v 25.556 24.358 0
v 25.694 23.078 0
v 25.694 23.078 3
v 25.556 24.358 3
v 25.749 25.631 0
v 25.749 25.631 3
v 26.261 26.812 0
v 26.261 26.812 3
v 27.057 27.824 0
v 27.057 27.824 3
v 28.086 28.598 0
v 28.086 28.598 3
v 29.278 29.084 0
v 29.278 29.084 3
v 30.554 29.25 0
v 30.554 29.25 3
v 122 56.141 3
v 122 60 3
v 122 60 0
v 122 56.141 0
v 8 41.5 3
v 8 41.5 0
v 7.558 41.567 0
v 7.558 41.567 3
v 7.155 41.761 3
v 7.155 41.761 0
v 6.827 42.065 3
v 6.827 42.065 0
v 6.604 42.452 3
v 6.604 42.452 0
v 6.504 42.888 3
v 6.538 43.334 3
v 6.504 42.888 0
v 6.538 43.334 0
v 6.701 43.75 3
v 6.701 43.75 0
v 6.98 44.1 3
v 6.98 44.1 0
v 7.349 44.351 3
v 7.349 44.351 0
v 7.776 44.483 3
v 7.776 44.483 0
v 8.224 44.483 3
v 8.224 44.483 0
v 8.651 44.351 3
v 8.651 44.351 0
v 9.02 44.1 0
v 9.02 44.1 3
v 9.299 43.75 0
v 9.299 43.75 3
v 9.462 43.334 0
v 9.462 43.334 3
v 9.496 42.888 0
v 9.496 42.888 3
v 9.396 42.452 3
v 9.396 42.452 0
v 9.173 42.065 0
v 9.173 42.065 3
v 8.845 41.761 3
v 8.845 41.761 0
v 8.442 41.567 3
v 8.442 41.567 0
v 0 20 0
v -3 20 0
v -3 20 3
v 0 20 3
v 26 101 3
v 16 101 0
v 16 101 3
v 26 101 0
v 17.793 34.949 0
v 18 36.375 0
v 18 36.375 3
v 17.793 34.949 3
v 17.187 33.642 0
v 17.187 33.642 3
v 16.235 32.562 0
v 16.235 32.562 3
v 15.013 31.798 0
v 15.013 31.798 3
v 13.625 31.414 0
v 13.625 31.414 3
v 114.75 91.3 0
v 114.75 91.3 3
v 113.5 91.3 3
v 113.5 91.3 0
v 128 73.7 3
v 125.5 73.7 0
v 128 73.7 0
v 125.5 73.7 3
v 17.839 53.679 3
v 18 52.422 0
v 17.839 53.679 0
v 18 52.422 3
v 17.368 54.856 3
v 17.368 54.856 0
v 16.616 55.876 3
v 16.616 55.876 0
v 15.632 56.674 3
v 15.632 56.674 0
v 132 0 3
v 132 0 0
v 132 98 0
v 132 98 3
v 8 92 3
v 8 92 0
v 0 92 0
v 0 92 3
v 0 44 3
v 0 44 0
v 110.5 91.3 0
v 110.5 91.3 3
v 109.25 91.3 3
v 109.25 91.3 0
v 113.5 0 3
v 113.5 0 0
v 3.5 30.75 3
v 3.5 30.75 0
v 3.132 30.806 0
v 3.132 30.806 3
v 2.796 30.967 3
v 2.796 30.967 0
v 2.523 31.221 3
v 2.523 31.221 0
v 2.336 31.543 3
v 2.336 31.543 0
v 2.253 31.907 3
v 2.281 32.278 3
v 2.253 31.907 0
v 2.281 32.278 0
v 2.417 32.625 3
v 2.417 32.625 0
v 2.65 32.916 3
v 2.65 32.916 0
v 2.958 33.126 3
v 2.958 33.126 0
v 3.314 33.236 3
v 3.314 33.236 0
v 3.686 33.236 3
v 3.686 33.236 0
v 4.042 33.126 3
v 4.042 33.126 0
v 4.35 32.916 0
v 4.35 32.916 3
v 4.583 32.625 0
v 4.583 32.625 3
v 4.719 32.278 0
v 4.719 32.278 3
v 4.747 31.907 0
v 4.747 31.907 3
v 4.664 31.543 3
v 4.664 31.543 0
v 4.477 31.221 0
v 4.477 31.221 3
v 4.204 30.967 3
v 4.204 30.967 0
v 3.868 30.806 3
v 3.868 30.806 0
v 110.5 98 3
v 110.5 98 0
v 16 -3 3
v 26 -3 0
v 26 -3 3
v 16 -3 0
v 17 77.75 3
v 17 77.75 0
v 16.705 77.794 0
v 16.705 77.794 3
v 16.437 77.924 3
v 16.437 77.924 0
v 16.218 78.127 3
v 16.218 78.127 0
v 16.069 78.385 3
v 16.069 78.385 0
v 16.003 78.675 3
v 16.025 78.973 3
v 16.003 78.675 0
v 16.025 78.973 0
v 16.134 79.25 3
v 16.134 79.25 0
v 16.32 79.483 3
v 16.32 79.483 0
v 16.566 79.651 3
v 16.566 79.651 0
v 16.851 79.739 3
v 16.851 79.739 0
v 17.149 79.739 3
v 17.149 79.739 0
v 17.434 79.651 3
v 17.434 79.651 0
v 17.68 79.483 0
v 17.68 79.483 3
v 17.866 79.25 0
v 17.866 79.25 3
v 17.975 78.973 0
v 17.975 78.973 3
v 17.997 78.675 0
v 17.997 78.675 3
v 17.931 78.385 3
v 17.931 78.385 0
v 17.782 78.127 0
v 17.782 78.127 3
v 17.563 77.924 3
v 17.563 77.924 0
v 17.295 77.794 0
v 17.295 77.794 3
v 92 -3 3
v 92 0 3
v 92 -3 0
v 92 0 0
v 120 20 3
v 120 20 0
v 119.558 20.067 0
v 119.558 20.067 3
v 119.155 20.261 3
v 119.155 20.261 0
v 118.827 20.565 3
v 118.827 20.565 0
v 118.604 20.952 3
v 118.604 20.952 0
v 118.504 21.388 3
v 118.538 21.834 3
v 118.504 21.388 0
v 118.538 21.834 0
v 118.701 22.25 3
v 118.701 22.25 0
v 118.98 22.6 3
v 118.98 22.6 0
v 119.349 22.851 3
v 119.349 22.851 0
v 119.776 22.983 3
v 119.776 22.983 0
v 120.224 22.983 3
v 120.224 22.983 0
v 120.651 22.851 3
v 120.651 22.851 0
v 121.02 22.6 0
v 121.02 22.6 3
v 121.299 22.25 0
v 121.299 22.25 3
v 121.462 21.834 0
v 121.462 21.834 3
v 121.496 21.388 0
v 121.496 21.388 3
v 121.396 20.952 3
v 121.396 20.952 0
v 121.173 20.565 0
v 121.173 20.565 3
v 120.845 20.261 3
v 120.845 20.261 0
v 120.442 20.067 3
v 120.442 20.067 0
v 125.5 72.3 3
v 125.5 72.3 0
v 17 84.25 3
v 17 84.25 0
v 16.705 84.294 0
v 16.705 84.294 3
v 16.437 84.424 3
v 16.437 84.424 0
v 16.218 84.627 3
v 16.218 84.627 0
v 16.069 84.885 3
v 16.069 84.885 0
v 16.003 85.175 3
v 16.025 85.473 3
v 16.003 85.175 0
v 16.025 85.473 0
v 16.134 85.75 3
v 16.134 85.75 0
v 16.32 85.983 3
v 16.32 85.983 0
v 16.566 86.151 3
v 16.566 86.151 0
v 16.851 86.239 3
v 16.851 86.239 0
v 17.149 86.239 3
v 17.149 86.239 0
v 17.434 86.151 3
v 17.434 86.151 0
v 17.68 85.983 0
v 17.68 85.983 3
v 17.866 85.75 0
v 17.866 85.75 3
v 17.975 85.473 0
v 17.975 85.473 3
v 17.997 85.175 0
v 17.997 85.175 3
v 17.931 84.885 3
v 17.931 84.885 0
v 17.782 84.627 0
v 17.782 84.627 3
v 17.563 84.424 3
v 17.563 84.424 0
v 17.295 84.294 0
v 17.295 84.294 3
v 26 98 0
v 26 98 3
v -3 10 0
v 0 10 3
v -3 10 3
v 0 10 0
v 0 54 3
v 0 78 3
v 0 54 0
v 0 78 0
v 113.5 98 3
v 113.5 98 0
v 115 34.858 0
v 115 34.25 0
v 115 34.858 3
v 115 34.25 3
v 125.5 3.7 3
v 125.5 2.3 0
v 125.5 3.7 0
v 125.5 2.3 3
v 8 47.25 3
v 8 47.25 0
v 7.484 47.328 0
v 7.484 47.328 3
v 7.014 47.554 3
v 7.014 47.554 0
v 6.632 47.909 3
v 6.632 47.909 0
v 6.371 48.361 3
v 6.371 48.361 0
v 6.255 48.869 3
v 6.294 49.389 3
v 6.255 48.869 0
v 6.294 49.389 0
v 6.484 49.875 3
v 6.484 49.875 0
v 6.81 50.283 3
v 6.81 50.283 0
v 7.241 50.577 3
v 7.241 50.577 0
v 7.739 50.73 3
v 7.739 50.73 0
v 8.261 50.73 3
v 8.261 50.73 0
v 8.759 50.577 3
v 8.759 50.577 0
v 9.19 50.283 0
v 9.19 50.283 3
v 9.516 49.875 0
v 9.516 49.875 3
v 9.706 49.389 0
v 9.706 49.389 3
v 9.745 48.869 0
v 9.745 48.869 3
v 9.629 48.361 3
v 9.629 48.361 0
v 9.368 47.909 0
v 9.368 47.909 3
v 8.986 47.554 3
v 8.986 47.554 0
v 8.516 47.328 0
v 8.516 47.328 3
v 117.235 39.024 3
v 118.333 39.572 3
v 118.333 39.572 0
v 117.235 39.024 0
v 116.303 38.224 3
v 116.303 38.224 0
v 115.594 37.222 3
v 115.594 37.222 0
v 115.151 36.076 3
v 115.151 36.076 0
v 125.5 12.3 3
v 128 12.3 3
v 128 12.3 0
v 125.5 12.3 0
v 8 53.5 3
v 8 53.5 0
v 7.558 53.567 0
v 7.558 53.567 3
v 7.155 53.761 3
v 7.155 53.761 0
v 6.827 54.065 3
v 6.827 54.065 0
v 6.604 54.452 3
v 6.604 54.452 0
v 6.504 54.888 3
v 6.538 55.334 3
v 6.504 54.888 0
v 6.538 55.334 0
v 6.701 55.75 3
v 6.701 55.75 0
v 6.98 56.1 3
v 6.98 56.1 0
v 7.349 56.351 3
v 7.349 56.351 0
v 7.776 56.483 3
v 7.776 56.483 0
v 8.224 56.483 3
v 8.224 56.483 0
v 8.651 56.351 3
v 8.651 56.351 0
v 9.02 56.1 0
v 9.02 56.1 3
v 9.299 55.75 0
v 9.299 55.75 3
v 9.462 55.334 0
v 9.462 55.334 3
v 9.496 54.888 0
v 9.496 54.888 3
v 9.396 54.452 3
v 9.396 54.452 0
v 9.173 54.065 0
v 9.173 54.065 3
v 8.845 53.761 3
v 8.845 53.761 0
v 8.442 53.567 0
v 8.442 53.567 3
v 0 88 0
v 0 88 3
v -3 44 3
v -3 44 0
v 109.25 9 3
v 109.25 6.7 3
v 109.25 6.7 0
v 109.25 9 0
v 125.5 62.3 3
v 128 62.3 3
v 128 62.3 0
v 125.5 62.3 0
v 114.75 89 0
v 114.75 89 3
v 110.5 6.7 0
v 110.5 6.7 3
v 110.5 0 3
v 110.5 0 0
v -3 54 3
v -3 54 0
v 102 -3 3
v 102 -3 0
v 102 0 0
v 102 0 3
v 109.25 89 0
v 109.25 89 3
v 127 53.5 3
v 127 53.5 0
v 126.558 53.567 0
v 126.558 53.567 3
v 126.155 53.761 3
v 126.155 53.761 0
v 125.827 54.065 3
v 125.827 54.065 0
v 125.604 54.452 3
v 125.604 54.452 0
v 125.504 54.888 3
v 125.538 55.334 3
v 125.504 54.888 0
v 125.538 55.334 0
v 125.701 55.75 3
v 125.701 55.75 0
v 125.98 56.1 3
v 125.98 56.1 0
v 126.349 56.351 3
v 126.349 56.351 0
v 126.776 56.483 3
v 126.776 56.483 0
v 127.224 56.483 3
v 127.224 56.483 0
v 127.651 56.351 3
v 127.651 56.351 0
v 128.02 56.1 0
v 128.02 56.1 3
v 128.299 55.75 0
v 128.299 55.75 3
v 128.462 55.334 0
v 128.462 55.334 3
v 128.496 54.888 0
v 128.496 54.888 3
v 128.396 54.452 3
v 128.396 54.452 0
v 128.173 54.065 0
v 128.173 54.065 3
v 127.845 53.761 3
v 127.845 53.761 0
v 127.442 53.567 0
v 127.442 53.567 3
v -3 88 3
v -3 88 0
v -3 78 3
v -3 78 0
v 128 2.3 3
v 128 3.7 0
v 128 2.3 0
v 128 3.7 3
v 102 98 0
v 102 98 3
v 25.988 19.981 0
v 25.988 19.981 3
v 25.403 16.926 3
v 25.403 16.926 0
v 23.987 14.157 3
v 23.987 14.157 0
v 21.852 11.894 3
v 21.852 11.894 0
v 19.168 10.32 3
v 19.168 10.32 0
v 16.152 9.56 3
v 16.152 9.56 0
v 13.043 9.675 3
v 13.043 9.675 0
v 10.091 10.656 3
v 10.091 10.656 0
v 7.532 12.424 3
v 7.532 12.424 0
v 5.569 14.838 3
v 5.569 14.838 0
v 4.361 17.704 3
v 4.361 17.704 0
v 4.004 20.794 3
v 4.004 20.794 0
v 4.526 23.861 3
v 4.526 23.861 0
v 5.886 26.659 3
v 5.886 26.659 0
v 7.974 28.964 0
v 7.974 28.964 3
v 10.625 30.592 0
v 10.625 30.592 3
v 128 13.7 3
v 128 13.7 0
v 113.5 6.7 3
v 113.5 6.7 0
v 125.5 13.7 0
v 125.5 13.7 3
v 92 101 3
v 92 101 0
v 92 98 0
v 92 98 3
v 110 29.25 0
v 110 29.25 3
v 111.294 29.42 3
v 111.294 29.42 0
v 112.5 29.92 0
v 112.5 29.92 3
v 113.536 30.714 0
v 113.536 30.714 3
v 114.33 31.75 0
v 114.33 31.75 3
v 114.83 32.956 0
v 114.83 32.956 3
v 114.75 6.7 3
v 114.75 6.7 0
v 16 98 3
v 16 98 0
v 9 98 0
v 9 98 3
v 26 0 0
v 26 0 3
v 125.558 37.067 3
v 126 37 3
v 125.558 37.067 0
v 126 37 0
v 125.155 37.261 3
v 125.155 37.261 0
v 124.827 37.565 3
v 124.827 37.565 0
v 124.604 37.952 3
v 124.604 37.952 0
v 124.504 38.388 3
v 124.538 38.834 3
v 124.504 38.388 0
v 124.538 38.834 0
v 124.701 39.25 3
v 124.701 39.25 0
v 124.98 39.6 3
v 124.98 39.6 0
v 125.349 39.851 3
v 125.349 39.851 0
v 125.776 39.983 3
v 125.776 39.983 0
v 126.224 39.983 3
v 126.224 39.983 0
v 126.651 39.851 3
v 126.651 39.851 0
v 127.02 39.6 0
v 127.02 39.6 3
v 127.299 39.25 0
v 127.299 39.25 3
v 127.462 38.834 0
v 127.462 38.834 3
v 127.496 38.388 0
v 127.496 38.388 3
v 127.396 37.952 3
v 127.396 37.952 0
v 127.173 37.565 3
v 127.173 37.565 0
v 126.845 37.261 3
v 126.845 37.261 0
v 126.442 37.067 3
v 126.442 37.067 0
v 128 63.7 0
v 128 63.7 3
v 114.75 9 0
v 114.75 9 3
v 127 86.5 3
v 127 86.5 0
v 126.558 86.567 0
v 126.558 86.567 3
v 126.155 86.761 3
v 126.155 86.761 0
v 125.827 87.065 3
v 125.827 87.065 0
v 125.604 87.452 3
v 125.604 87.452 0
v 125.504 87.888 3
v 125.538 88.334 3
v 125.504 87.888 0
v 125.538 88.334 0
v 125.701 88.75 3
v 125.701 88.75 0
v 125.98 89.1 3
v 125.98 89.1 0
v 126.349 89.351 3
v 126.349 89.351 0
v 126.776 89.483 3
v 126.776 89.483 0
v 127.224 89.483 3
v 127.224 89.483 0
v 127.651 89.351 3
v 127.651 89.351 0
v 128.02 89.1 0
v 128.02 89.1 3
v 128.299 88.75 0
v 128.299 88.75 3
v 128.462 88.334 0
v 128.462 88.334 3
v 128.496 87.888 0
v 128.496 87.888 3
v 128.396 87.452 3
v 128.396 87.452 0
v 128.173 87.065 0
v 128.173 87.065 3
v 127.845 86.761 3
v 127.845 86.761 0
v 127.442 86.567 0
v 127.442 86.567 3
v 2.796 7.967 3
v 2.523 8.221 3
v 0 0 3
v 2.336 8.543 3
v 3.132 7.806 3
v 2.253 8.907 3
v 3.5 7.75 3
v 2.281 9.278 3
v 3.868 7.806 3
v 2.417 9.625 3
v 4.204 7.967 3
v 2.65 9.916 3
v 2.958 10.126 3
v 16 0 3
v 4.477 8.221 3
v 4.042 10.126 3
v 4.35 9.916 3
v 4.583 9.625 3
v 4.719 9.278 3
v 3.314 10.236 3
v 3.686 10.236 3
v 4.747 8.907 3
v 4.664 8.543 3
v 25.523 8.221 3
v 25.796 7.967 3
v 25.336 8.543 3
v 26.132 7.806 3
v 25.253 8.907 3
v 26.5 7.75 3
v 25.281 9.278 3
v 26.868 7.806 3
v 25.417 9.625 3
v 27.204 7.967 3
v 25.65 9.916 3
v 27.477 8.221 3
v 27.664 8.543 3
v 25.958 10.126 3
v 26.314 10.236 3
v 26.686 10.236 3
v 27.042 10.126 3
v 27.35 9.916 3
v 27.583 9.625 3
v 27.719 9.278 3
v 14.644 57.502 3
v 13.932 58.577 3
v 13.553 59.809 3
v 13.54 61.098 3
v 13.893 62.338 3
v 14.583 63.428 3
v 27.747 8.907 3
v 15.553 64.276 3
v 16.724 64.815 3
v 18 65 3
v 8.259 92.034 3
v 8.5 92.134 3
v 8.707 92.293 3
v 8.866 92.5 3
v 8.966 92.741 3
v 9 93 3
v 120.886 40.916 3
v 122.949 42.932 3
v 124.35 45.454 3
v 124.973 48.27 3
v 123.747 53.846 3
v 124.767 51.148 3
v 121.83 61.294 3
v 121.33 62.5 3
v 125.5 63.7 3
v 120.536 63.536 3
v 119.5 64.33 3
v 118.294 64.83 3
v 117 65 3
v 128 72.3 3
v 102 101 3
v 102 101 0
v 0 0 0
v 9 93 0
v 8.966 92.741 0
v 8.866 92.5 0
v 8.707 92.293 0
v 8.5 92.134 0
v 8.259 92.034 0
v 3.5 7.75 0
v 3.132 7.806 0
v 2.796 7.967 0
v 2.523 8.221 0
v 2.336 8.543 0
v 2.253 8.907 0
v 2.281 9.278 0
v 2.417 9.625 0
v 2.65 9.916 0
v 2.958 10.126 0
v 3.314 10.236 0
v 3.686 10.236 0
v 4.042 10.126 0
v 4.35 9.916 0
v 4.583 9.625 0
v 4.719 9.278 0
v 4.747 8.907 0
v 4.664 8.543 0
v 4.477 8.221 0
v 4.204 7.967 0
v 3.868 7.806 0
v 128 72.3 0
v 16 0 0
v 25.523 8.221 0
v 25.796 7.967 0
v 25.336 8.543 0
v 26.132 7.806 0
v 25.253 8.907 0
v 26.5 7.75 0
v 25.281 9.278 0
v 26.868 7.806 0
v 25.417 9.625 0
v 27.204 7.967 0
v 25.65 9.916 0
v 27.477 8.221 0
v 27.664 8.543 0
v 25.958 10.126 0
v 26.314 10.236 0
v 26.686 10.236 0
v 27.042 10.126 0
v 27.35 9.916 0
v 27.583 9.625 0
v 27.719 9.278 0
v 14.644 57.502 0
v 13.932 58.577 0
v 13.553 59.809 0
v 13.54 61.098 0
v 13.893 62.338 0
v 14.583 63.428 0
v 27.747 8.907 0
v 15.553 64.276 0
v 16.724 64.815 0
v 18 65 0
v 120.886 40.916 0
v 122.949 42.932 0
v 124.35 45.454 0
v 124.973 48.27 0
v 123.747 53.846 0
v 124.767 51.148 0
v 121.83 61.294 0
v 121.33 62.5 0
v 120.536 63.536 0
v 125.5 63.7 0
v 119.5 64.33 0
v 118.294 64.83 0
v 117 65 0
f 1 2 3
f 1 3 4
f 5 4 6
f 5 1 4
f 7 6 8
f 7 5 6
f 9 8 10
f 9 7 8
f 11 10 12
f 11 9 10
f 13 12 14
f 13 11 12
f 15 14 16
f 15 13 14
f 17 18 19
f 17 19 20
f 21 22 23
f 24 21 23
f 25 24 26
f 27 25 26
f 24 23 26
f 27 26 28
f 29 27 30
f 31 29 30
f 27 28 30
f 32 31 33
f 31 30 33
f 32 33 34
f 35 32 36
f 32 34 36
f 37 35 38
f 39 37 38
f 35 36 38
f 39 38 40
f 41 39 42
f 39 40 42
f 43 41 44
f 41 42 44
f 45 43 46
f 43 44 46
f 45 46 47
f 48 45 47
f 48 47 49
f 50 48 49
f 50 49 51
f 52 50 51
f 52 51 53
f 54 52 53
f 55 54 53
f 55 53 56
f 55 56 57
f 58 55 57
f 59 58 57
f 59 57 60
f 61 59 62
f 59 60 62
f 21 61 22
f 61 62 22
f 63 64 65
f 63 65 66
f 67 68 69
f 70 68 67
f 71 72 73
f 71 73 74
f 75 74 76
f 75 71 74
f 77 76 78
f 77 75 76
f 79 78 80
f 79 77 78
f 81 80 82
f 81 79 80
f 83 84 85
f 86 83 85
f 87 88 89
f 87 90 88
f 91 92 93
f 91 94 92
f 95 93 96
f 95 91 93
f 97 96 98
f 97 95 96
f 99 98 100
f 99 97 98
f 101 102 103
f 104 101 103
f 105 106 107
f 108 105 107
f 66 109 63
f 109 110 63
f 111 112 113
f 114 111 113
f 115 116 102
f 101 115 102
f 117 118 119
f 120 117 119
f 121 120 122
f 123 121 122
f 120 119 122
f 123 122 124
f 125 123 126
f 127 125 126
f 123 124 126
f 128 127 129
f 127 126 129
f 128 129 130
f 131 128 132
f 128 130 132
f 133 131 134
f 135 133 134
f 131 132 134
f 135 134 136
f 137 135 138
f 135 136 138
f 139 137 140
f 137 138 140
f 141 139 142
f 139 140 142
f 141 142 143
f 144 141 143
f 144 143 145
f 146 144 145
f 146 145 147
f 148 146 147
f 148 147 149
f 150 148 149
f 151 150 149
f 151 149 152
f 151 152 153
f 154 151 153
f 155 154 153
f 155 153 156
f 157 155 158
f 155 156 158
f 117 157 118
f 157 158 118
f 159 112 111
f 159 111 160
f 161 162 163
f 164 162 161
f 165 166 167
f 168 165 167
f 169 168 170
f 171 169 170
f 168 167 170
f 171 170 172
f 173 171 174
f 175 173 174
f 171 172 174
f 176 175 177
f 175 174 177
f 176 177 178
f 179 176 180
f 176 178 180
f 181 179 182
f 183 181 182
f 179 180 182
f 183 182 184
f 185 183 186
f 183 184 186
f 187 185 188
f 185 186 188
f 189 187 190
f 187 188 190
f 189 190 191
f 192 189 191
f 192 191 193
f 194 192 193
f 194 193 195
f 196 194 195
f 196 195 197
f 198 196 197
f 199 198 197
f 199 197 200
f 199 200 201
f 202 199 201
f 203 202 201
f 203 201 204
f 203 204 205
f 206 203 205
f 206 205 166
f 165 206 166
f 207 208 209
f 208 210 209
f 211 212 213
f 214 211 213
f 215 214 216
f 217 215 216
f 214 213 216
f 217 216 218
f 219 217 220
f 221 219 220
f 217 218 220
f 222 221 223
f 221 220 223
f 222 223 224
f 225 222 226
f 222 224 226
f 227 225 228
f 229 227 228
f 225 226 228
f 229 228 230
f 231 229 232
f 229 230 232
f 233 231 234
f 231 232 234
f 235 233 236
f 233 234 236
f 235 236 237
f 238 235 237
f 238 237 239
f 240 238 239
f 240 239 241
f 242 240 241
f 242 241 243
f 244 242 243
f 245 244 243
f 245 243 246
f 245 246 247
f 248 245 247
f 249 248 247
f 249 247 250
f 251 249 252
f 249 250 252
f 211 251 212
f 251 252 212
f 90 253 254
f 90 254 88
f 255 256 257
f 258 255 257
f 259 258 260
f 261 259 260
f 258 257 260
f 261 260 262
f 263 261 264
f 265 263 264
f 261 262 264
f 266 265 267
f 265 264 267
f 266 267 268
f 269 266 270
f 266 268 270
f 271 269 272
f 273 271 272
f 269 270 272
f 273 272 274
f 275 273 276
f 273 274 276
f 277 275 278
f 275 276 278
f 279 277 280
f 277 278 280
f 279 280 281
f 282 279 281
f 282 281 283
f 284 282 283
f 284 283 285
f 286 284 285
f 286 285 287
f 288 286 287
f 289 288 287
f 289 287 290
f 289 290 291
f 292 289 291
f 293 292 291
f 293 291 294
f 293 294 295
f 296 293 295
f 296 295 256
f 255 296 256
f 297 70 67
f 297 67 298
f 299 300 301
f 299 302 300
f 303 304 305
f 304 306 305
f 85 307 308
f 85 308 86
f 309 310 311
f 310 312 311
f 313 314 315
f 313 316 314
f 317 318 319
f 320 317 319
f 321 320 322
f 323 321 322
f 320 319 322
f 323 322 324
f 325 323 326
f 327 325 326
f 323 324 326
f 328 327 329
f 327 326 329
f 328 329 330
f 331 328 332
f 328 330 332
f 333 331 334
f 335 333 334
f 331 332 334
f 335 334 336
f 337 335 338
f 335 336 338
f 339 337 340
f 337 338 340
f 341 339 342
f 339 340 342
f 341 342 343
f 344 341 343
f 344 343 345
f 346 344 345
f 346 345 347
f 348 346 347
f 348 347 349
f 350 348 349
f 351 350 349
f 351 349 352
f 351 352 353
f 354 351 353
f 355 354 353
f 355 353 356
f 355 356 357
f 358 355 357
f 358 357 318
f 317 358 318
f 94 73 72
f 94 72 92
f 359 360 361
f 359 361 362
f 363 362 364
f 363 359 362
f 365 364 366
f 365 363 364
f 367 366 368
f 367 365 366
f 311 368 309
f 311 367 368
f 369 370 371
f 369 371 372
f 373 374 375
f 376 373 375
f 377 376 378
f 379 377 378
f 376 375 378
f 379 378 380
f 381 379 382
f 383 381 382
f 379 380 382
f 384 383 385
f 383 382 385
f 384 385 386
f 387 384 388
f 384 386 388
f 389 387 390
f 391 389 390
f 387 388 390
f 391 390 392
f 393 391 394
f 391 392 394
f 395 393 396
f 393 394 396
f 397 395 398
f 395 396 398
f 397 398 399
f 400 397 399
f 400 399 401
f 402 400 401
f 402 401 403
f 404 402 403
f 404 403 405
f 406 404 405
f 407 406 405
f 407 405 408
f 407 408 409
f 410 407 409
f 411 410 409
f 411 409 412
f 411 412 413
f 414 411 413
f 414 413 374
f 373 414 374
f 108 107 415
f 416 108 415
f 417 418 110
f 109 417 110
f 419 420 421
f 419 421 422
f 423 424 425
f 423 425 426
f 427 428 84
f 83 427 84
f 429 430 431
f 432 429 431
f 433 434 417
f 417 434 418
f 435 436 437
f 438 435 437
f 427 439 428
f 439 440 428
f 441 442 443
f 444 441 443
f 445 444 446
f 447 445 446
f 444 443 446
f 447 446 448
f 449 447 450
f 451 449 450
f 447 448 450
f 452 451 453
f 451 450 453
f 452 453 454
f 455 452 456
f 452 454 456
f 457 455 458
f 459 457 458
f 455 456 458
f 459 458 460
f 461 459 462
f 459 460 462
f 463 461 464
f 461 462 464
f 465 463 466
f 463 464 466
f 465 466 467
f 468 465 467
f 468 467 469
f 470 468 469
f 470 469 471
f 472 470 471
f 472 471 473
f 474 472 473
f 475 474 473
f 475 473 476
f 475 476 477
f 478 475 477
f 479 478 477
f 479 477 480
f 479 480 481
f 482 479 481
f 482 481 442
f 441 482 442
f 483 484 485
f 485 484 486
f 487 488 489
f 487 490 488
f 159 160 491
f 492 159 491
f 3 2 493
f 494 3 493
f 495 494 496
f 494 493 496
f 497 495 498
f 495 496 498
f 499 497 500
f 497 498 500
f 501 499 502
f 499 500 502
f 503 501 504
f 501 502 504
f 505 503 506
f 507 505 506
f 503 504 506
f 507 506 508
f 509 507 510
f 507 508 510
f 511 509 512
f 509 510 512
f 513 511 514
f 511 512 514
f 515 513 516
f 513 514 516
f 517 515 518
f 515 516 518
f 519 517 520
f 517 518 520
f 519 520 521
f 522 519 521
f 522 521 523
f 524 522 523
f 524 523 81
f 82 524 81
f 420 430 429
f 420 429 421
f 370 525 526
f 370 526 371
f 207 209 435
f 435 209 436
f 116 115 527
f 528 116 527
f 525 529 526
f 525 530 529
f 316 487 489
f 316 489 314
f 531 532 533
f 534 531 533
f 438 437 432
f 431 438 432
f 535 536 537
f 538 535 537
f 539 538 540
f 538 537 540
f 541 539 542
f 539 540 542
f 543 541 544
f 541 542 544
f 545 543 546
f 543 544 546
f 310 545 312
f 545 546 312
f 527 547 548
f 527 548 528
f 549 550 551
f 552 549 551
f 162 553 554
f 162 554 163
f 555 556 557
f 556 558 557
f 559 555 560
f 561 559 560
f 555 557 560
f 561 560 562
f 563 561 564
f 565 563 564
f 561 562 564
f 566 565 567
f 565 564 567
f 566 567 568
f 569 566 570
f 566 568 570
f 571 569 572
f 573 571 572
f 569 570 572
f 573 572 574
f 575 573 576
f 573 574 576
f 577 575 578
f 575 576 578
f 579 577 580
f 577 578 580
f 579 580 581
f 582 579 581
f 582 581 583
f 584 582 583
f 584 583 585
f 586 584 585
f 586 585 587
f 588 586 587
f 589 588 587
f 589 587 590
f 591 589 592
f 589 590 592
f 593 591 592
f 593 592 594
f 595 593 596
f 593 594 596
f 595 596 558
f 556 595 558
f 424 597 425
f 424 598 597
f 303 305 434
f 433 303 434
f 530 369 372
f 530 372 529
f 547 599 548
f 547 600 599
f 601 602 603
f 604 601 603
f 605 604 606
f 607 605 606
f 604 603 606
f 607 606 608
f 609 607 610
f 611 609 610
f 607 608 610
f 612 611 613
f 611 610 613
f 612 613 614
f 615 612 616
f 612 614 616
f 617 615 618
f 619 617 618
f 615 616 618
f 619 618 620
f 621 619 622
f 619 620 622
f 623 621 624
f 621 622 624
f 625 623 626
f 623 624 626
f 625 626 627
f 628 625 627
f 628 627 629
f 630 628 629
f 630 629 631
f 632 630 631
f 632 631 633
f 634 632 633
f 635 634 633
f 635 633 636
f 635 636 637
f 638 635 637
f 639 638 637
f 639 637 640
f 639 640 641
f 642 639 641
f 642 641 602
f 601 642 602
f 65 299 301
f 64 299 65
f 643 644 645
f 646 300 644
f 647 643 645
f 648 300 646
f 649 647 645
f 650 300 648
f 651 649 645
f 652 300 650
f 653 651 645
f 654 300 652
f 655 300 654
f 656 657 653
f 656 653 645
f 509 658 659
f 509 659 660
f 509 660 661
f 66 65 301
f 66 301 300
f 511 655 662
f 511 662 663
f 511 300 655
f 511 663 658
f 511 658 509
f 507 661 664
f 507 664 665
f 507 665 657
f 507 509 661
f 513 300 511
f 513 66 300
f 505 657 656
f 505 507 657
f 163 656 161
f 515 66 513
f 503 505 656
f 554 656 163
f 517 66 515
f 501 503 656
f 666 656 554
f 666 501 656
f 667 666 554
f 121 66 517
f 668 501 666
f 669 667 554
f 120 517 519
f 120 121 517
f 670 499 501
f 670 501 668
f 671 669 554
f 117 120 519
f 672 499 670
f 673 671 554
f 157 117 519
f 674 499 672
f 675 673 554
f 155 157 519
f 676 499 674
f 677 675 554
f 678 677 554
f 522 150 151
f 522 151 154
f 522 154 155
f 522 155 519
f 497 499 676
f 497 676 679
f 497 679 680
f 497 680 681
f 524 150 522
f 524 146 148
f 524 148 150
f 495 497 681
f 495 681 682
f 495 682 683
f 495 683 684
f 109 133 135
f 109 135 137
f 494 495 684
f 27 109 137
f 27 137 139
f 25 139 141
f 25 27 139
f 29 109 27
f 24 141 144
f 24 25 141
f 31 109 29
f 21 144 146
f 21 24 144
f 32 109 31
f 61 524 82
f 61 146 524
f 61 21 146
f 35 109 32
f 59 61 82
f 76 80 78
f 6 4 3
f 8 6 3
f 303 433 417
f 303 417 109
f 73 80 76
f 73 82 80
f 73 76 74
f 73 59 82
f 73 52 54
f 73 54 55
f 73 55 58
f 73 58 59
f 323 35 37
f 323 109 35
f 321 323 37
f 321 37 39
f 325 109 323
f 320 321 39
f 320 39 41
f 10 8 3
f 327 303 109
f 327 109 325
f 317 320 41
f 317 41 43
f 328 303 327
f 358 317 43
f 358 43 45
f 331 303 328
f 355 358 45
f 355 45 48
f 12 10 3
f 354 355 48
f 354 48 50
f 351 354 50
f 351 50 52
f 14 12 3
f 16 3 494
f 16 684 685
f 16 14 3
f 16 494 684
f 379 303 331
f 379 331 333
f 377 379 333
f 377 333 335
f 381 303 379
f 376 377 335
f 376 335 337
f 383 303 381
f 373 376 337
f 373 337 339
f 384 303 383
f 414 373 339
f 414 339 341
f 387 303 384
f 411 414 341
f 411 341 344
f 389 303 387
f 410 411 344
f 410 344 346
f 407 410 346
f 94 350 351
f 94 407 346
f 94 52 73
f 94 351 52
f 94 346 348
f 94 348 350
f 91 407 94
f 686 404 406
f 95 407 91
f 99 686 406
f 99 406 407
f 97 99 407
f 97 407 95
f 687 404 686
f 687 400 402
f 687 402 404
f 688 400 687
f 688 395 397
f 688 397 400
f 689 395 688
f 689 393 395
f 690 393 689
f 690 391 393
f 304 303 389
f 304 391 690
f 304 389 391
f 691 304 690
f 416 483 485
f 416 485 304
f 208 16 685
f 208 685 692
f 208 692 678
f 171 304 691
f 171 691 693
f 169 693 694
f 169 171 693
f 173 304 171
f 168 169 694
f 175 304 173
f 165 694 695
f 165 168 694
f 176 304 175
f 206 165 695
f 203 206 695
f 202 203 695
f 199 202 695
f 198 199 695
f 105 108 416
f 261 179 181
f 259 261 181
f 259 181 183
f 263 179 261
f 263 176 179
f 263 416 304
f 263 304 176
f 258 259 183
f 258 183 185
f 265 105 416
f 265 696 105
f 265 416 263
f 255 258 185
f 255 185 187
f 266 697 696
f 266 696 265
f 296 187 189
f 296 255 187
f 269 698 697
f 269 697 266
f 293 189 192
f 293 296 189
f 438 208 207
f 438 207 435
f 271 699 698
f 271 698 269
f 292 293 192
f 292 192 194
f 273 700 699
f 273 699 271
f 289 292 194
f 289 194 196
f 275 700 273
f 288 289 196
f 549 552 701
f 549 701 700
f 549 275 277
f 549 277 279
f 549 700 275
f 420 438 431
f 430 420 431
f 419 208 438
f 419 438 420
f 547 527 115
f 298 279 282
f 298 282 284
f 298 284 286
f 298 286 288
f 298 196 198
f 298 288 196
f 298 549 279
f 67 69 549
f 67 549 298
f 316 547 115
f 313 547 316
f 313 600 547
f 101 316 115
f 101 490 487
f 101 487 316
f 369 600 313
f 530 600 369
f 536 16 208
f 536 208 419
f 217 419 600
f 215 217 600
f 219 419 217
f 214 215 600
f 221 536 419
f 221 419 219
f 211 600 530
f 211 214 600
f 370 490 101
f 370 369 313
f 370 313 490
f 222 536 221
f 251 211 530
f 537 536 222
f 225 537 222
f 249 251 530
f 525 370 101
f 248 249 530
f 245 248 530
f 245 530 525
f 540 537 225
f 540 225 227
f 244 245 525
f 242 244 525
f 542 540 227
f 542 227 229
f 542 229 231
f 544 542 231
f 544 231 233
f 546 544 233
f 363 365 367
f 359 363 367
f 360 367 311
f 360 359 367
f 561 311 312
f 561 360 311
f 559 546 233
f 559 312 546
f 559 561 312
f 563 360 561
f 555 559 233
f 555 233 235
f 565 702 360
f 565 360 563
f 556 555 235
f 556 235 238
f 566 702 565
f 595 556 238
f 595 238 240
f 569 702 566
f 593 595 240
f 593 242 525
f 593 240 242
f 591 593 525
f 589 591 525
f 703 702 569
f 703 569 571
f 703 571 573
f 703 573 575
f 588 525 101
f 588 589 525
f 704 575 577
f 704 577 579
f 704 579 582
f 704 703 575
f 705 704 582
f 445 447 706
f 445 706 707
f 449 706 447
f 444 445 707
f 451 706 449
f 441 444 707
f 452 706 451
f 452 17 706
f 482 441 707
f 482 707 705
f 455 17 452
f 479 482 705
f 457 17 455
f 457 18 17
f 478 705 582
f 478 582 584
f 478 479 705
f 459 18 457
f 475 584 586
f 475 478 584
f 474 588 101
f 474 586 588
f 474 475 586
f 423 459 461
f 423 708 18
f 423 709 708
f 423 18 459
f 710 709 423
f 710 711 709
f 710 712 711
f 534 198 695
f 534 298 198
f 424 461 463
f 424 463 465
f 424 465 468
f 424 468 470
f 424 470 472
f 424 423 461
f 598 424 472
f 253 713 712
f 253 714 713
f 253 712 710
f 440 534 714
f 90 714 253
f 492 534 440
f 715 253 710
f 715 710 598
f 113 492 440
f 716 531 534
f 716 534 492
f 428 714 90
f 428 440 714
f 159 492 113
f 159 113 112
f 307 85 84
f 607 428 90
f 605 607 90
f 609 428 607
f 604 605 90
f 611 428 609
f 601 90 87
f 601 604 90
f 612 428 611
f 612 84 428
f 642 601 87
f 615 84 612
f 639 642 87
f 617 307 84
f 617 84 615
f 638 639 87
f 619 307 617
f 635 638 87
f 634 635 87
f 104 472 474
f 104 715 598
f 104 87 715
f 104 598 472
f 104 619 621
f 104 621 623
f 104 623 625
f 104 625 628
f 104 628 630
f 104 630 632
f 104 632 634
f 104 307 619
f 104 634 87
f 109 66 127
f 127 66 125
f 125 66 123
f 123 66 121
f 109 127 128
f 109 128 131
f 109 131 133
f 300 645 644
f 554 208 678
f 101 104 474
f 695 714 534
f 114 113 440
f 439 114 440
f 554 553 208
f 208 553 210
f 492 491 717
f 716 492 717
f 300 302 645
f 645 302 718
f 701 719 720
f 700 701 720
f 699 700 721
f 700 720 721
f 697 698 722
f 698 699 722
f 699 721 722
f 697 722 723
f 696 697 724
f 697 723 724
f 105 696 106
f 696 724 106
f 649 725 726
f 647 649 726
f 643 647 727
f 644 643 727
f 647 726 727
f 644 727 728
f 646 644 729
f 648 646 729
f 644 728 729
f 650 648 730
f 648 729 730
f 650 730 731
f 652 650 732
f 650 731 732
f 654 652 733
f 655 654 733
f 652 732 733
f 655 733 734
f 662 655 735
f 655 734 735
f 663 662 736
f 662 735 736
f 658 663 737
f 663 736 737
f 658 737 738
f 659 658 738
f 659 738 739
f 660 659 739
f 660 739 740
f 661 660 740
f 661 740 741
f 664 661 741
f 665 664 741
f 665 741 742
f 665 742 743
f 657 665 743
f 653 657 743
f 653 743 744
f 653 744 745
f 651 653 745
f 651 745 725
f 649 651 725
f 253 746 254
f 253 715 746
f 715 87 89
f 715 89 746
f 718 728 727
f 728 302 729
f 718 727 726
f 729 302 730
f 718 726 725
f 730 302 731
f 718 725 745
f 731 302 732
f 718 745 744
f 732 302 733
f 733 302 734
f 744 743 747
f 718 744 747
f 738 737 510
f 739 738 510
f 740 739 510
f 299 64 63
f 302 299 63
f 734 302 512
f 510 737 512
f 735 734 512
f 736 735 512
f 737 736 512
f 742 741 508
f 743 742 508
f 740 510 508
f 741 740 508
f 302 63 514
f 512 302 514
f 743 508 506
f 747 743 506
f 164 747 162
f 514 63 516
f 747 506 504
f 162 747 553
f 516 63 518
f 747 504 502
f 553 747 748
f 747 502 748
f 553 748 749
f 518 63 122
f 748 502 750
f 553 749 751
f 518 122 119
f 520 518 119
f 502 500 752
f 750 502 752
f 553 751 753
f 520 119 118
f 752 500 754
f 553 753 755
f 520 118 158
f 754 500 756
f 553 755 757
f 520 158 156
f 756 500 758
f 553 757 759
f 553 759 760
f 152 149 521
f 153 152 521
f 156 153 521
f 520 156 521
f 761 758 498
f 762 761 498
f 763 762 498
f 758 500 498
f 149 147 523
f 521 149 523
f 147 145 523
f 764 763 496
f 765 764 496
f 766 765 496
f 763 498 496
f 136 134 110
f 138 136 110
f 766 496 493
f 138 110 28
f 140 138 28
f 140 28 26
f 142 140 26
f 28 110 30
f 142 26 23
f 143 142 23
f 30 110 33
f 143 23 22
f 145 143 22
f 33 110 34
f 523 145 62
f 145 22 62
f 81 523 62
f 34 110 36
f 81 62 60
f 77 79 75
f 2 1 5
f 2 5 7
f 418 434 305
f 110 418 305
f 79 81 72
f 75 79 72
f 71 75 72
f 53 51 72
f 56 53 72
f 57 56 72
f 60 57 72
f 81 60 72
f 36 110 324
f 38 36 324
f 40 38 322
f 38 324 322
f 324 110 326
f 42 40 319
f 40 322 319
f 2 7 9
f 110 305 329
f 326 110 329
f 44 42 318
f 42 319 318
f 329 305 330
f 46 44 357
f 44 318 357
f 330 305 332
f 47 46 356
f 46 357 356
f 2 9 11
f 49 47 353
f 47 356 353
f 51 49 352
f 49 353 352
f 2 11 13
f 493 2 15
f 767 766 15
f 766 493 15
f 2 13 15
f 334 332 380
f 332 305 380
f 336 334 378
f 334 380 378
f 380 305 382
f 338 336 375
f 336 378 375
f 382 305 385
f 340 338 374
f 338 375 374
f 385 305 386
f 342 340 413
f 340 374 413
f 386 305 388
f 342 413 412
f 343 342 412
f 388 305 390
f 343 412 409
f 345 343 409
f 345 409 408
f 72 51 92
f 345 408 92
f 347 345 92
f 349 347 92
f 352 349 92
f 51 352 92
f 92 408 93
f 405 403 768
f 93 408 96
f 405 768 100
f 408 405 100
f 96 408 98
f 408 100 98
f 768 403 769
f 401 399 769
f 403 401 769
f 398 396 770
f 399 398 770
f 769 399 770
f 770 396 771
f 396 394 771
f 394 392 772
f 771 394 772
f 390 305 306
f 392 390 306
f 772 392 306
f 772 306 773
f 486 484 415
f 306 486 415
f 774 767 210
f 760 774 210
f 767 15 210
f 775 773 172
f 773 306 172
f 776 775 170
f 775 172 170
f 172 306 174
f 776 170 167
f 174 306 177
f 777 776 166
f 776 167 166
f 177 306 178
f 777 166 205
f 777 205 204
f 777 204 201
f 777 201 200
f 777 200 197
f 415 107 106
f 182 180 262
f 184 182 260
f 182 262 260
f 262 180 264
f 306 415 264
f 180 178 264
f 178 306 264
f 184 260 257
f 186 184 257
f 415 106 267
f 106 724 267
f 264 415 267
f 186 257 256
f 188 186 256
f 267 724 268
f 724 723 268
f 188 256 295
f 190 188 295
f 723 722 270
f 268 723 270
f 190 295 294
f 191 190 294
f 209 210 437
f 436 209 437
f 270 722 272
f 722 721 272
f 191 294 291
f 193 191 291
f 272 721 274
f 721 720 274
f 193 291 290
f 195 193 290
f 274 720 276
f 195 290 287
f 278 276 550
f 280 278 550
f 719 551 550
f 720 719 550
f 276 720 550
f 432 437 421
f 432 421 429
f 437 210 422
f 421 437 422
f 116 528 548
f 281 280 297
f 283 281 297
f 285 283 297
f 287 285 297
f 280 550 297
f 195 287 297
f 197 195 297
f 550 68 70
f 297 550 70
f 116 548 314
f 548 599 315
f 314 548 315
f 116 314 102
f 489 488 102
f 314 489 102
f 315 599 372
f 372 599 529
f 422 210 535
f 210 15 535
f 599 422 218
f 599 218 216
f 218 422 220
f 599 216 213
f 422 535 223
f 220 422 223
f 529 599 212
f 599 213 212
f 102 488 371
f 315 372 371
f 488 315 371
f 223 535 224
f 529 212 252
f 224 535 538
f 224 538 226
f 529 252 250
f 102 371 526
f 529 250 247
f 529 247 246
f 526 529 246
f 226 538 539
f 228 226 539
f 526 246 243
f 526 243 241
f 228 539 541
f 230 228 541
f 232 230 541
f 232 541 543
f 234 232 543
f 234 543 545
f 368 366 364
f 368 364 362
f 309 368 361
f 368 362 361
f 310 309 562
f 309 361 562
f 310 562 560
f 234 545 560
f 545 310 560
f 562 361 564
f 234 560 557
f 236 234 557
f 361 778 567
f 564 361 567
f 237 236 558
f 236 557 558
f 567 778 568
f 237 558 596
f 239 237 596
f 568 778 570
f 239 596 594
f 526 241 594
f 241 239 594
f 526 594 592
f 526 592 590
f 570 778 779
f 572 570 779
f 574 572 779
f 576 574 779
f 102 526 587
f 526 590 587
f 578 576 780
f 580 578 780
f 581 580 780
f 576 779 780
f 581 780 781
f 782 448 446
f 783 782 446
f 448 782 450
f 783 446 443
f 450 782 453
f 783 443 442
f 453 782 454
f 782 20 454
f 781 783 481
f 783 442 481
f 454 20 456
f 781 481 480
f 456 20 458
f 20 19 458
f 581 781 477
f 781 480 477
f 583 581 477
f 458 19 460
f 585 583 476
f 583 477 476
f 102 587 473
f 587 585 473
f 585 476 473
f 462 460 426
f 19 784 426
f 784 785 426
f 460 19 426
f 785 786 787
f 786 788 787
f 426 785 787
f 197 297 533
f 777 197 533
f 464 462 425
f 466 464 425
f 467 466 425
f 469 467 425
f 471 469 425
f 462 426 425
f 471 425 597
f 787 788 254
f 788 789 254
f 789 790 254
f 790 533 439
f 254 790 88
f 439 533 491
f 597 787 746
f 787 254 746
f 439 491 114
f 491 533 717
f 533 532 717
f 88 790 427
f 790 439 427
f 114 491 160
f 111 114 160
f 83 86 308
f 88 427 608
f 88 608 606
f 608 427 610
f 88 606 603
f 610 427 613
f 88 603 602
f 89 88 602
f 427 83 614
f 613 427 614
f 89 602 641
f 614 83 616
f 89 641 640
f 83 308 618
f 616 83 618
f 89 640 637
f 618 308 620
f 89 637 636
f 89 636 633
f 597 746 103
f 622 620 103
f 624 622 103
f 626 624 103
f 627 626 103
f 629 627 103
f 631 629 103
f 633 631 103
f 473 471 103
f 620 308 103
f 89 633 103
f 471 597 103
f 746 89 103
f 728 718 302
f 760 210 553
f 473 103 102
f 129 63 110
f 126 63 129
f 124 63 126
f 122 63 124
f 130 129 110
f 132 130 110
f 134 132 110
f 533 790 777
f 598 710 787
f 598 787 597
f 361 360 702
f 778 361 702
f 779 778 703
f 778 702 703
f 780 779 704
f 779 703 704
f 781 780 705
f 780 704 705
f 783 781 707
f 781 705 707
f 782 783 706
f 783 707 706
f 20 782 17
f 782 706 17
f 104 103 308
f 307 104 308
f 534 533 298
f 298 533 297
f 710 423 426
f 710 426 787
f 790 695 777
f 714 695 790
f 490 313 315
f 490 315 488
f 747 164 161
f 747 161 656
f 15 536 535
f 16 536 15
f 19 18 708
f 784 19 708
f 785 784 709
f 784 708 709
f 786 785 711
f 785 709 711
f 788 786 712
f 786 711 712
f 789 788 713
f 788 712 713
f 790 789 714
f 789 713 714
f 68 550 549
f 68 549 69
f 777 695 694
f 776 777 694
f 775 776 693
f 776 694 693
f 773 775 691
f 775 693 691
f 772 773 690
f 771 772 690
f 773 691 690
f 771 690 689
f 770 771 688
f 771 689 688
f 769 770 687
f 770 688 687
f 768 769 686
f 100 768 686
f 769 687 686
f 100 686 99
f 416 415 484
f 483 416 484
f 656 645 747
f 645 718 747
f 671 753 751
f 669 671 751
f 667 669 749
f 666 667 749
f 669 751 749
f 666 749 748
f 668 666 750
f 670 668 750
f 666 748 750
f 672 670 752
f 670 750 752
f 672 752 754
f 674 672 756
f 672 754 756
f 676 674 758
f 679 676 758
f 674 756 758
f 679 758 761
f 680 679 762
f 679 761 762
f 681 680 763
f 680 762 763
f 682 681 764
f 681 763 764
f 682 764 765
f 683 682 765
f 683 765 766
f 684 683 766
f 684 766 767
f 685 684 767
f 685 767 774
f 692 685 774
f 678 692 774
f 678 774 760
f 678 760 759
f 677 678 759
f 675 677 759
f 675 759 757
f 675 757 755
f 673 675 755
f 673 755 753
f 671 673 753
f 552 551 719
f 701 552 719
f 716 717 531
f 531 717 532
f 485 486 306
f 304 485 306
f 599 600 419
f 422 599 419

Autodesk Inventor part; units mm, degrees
ref_plane "YZ Plane" through (0, 0, 0) normal (1, 0, 0) x (0, 1, 0)
ref_plane "XZ Plane" through (0, 0, 0) normal (0, 1, 0) x (-1, 0, 0)
ref_plane "XY Plane" through (0, 0, 0) normal (0, 0, 1) x (1, 0, 0)
sketch "Sketch1" plane through (0, 0, 0) normal (0, 0, 1) x (1, 0, 0)
  line L0 (0, 0) -> (132, 0)
  line L1 (132, 0) -> (132, 98)
  line L2 (132, 98) -> (0, 98)
  line L3 (0, 98) -> (0, 0)
  line L4 (16, 101) -> (26, 101)
  line L5 (26, 101) -> (26, -3)
  line L6 (26, -3) -> (16, -3)
  line L7 (16, -3) -> (16, 101)
  line L8 (102, 101) -> (92, 101)
  line L9 (92, 101) -> (92, -3)
  line L10 (92, -3) -> (102, -3)
  line L11 (102, -3) -> (102, 101)
  line L12 (0, 88) -> (-3, 88)
  line L13 (-3, 88) -> (-3, 78)
  line L14 (-3, 78) -> (0, 78)
  line L15 (0, 78) -> (0, 88)
  line L16 (0, 10) -> (-3, 10)
  line L17 (-3, 10) -> (-3, 20)
  line L18 (-3, 20) -> (0, 20)
  line L19 (0, 20) -> (0, 10)
  line L20 (0, 54) -> (-3, 54)
  line L21 (-3, 54) -> (-3, 44)
  line L22 (-3, 44) -> (0, 44)
  line L23 (0, 44) -> (0, 54)
  line L24 (0, 98) -> (9, 98)
  line L25 (9, 98) -> (9, 93)
  line L26 (8, 92) -> (0, 92)
  line L27 (0, 92) -> (0, 98)
  arc A0 (8, 92) -> (9, 93) centre (8, 93) ccw
  point P0 (9, 92)
  dimension "d0" = 98
  dimension "d1" = 132
  dimension "d74" = 10
  dimension "d77" = 10
  dimension "d306" = 16
  dimension "d307" = 104
  dimension "d308" = 3
  dimension "d309" = 3
  dimension "d310" = 104
  dimension "d311" = 30
  dimension "d312" = 3
  dimension "d313" = 10
  dimension "d314" = 10
  dimension "d315" = 3
  dimension "d316" = 10
  dimension "d317" = 10
  dimension "d318" = 10
  dimension "d319" = 3
  dimension "d320" = 24
  dimension "d368" = 9
  dimension "d369" = 6
  dimension "d370" = 1
extrude "Extrusion1" add sketch "Sketch1" along normal blind 3 contours L3 L26 A0 L25 L2 L7 L0 | L7 L2 L5 L0 | L0 L5 L6 L7 | L16 L17 L18 L3 | L5 L2 L9 L0 | L7 L4 L5 L2 | L9 L2 L11 L0 | L0 L11 L10 L9 | L22 L21 L20 L3 | L11 L2 L1 L0 | L9 L8 L11 L2 | L14 L13 L12 L3
sketch "Sketch11" plane through (0, 0, 3) normal (0, 0, 1) x (1, 0, 0)
  line L0 (0, 0) -> (0, 98) projected
  line L1 (6, 0) -> (0, 0) projected
  point P0 (15, 20.5)
  dimension "d141" = 20.5
  dimension "d142" = 15
hole "Hole7" at (15, 20.5, 3) direction (0, 0, -1) diameter 22 end through all
sketch "Sketch12" plane through (0, 0, 3) normal (0, 0, 1) x (1, 0, 0)
  circle A0 centre (15, 20.5) radius 11 projected
  point P0 (3.5, 32)
  point P1 (26.5, 9)
  point P2 (3.5, 9)
  dimension "d152" = 11.5
  dimension "d153" = 11.5
  dimension "d161" = 11.5
  dimension "d162" = 11.5
  dimension "d163" = 11.5
  dimension "d164" = 11.5
hole "Hole8" at (3.5, 32, 3) at (26.5, 9, 3) at (3.5, 9, 3) direction (0, 0, -1) diameter 2.5 end through all
sketch "Sketch20" plane through (0, 0, 3) normal (0, 0, 1) x (1, 0, 0)
  line L0 (132, 0) -> (120, 0) projected
  line L1 (132, 98) -> (132, 0) projected
  line L2 (120, 98) -> (132, 98) projected
  line L3 (125.5, 73.7) -> (128, 73.7)
  line L4 (128, 73.7) -> (128, 72.3)
  line L5 (128, 72.3) -> (125.5, 72.3)
  line L6 (125.5, 72.3) -> (125.5, 73.7)
  line L7 (125.5, 63.7) -> (128, 63.7)
  line L8 (128, 63.7) -> (128, 62.3)
  line L9 (128, 62.3) -> (125.5, 62.3)
  line L10 (125.5, 62.3) -> (125.5, 63.7)
  line L11 (125.5, 13.7) -> (128, 13.7)
  line L12 (128, 13.7) -> (128, 12.3)
  line L13 (128, 12.3) -> (125.5, 12.3)
  line L14 (125.5, 12.3) -> (125.5, 13.7)
  line L15 (125.5, 3.7) -> (128, 3.7)
  line L16 (128, 3.7) -> (128, 2.3)
  line L17 (128, 2.3) -> (125.5, 2.3)
  line L18 (125.5, 2.3) -> (125.5, 3.7)
  dimension "d208" = 1.4
  dimension "d209" = 24.3
  dimension "d210" = 4
  dimension "d211" = 2.5
  dimension "d212" = 1.4
  dimension "d213" = 8.6
  dimension "d214" = 2.5
  dimension "d215" = 1.4
  dimension "d216" = 2.3
  dimension "d217" = 4
  dimension "d218" = 8.6
  dimension "d219" = 1.4
extrude "Extrusion10" cut sketch "Sketch20" against normal through all
sketch "Sketch26" plane through (0, 0, 3) normal (0, 0, 1) x (1, 0, 0)
  line L0 (0, 98) -> (6, 98) projected
  line L1 (0, 88) -> (0, 98) projected
  point P0 (17, 85.25)
  point P1 (17, 78.75)
  dimension "d289" = 6.5
  dimension "d290" = 12.75
  dimension "d366" = 17
hole "Hole13" at (17, 85.25, 3) at (17, 78.75, 3) direction (0, 0, -1) diameter 2 end through all
sketch "草圖28" plane through (0, 0, 3) normal (0, 0, 1) x (1, 0, 0)
  line L0 (132, 0) -> (102, 0) projected
  line L1 (132, 98) -> (132, 0) projected
  line L2 (102, 98) -> (132, 98) projected
  line L3 (110.5, 98) -> (113.5, 98)
  line L4 (113.5, 98) -> (113.5, 89)
  line L5 (113.5, 89) -> (110.5, 89)
  line L6 (110.5, 89) -> (110.5, 98)
  line L7 (109.25, 89) -> (114.75, 89)
  line L8 (114.75, 89) -> (114.75, 91.3)
  line L9 (114.75, 91.3) -> (109.25, 91.3)
  line L10 (109.25, 91.3) -> (109.25, 89)
  line L11 (113.5, 9) -> (110.5, 9)
  line L12 (110.5, 9) -> (110.5, 0)
  line L13 (110.5, 0) -> (113.5, 0)
  line L14 (113.5, 0) -> (113.5, 9)
  line L15 (109.25, 9) -> (114.75, 9)
  line L16 (114.75, 9) -> (114.75, 6.7)
  line L17 (114.75, 6.7) -> (109.25, 6.7)
  line L18 (109.25, 6.7) -> (109.25, 9)
  dimension "d321" = 9
  dimension "d323" = 3
  dimension "d324" = 5.5
  dimension "d325" = 2.3
  dimension "d326" = 1.25
  dimension "d327" = 18.5
  dimension "d328" = 18.5
  dimension "d329" = 9
  dimension "d330" = 5.5
  dimension "d331" = 2.3
  dimension "d378" = 1.25
extrude "擠出14" cut sketch "草圖28" against normal through all
sketch "草圖29" plane through (0, 0, 3) normal (0, 0, 1) x (1, 0, 0)
  line L0 (26, 98) -> (16, 98) projected
  line L1 (0, 54) -> (0, 78) projected
  point P0 (0, 98)
  point P1 (8, 49)
  dimension "d336" = 8
  dimension "d337" = 49
hole "孔14" at (8, 49, 3) direction (0, 0, -1) diameter 3.5 end through all
sketch "草圖30" plane through (0, 0, 3) normal (0, 0, 1) x (1, 0, 0)
  circle A0 centre (8, 49) radius 1.75 projected
  line L0 (132, 0) -> (113.5, 0) projected
  line L1 (132, 98) -> (132, 0) projected
  line L2 (113.5, 98) -> (132, 98) projected
  point P0 (8, 55)
  point P1 (8, 43)
  point P2 (120, 21.5)
  point P3 (126, 38.5)
  point P4 (127, 55)
  point P5 (127, 88)
  dimension "d345" = 6
  dimension "d346" = 6
  dimension "d371" = 21.5
  dimension "d372" = 12
  dimension "d373" = 6
  dimension "d374" = 38.5
  dimension "d375" = 5
  dimension "d376" = 55
  dimension "d377" = 10
  dimension "d381" = 5
hole "孔15" at (8, 55, 3) at (8, 43, 3) at (127, 88, 3) at (127, 55, 3) at (126, 38.5, 3) at (120, 21.5, 3) direction (0, 0, -1) diameter 3 end through all
sketch "草圖31" plane through (0, 0, 3) normal (0, 0, 1) x (1, 0, 0)
  line L0 (26, 98) -> (92, 98) projected
  line L1 (0, 54) -> (0, 78) projected
  line L2 (18, 65) -> (117, 65)
  line L3 (110, 29.25) -> (18, 29.25)
  line L4 (18, 29.25) -> (18, 52.4223)
  arc A0 (18, 65) -> (15.6316, 56.6737) centre (18, 60.5) ccw
  arc A1 (118.3333, 39.5719) -> (122, 56.1414) centre (115, 49) ccw
  line L5 (115, 34.25) -> (115, 34.8579)
  line L6 (122, 60) -> (122, 56.1414)
  arc A2 (18, 52.4223) -> (15.6316, 56.6737) centre (13, 52.4223) ccw
  arc A3 (122, 60) -> (117, 65) centre (117, 60) ccw
  arc A4 (118.3333, 39.5719) -> (115, 34.8579) centre (120, 34.8579) ccw
  arc A5 (110, 29.25) -> (115, 34.25) centre (110, 34.25) ccw
  line L7 (132, 98) -> (132, 0) projected
  point P0 (115, 39)
  point P1 (18, 56)
  point P2 (132, 86.882)
  dimension "d354" = 35.75
  dimension "d356" = 33
  dimension "d358" = 18
  dimension "d359" = 9
  dimension "d360" = 20
  dimension "d362" = 5
  dimension "d379" = 10
  dimension "d380" = 17
extrude "擠出15" cut sketch "草圖31" against normal through all
fillet "圓角9" radius 5 2 edges at (18, 31.083, 1.5) (21.6661, 29.25, 1.5)
properties part number "plastic_part_52"
